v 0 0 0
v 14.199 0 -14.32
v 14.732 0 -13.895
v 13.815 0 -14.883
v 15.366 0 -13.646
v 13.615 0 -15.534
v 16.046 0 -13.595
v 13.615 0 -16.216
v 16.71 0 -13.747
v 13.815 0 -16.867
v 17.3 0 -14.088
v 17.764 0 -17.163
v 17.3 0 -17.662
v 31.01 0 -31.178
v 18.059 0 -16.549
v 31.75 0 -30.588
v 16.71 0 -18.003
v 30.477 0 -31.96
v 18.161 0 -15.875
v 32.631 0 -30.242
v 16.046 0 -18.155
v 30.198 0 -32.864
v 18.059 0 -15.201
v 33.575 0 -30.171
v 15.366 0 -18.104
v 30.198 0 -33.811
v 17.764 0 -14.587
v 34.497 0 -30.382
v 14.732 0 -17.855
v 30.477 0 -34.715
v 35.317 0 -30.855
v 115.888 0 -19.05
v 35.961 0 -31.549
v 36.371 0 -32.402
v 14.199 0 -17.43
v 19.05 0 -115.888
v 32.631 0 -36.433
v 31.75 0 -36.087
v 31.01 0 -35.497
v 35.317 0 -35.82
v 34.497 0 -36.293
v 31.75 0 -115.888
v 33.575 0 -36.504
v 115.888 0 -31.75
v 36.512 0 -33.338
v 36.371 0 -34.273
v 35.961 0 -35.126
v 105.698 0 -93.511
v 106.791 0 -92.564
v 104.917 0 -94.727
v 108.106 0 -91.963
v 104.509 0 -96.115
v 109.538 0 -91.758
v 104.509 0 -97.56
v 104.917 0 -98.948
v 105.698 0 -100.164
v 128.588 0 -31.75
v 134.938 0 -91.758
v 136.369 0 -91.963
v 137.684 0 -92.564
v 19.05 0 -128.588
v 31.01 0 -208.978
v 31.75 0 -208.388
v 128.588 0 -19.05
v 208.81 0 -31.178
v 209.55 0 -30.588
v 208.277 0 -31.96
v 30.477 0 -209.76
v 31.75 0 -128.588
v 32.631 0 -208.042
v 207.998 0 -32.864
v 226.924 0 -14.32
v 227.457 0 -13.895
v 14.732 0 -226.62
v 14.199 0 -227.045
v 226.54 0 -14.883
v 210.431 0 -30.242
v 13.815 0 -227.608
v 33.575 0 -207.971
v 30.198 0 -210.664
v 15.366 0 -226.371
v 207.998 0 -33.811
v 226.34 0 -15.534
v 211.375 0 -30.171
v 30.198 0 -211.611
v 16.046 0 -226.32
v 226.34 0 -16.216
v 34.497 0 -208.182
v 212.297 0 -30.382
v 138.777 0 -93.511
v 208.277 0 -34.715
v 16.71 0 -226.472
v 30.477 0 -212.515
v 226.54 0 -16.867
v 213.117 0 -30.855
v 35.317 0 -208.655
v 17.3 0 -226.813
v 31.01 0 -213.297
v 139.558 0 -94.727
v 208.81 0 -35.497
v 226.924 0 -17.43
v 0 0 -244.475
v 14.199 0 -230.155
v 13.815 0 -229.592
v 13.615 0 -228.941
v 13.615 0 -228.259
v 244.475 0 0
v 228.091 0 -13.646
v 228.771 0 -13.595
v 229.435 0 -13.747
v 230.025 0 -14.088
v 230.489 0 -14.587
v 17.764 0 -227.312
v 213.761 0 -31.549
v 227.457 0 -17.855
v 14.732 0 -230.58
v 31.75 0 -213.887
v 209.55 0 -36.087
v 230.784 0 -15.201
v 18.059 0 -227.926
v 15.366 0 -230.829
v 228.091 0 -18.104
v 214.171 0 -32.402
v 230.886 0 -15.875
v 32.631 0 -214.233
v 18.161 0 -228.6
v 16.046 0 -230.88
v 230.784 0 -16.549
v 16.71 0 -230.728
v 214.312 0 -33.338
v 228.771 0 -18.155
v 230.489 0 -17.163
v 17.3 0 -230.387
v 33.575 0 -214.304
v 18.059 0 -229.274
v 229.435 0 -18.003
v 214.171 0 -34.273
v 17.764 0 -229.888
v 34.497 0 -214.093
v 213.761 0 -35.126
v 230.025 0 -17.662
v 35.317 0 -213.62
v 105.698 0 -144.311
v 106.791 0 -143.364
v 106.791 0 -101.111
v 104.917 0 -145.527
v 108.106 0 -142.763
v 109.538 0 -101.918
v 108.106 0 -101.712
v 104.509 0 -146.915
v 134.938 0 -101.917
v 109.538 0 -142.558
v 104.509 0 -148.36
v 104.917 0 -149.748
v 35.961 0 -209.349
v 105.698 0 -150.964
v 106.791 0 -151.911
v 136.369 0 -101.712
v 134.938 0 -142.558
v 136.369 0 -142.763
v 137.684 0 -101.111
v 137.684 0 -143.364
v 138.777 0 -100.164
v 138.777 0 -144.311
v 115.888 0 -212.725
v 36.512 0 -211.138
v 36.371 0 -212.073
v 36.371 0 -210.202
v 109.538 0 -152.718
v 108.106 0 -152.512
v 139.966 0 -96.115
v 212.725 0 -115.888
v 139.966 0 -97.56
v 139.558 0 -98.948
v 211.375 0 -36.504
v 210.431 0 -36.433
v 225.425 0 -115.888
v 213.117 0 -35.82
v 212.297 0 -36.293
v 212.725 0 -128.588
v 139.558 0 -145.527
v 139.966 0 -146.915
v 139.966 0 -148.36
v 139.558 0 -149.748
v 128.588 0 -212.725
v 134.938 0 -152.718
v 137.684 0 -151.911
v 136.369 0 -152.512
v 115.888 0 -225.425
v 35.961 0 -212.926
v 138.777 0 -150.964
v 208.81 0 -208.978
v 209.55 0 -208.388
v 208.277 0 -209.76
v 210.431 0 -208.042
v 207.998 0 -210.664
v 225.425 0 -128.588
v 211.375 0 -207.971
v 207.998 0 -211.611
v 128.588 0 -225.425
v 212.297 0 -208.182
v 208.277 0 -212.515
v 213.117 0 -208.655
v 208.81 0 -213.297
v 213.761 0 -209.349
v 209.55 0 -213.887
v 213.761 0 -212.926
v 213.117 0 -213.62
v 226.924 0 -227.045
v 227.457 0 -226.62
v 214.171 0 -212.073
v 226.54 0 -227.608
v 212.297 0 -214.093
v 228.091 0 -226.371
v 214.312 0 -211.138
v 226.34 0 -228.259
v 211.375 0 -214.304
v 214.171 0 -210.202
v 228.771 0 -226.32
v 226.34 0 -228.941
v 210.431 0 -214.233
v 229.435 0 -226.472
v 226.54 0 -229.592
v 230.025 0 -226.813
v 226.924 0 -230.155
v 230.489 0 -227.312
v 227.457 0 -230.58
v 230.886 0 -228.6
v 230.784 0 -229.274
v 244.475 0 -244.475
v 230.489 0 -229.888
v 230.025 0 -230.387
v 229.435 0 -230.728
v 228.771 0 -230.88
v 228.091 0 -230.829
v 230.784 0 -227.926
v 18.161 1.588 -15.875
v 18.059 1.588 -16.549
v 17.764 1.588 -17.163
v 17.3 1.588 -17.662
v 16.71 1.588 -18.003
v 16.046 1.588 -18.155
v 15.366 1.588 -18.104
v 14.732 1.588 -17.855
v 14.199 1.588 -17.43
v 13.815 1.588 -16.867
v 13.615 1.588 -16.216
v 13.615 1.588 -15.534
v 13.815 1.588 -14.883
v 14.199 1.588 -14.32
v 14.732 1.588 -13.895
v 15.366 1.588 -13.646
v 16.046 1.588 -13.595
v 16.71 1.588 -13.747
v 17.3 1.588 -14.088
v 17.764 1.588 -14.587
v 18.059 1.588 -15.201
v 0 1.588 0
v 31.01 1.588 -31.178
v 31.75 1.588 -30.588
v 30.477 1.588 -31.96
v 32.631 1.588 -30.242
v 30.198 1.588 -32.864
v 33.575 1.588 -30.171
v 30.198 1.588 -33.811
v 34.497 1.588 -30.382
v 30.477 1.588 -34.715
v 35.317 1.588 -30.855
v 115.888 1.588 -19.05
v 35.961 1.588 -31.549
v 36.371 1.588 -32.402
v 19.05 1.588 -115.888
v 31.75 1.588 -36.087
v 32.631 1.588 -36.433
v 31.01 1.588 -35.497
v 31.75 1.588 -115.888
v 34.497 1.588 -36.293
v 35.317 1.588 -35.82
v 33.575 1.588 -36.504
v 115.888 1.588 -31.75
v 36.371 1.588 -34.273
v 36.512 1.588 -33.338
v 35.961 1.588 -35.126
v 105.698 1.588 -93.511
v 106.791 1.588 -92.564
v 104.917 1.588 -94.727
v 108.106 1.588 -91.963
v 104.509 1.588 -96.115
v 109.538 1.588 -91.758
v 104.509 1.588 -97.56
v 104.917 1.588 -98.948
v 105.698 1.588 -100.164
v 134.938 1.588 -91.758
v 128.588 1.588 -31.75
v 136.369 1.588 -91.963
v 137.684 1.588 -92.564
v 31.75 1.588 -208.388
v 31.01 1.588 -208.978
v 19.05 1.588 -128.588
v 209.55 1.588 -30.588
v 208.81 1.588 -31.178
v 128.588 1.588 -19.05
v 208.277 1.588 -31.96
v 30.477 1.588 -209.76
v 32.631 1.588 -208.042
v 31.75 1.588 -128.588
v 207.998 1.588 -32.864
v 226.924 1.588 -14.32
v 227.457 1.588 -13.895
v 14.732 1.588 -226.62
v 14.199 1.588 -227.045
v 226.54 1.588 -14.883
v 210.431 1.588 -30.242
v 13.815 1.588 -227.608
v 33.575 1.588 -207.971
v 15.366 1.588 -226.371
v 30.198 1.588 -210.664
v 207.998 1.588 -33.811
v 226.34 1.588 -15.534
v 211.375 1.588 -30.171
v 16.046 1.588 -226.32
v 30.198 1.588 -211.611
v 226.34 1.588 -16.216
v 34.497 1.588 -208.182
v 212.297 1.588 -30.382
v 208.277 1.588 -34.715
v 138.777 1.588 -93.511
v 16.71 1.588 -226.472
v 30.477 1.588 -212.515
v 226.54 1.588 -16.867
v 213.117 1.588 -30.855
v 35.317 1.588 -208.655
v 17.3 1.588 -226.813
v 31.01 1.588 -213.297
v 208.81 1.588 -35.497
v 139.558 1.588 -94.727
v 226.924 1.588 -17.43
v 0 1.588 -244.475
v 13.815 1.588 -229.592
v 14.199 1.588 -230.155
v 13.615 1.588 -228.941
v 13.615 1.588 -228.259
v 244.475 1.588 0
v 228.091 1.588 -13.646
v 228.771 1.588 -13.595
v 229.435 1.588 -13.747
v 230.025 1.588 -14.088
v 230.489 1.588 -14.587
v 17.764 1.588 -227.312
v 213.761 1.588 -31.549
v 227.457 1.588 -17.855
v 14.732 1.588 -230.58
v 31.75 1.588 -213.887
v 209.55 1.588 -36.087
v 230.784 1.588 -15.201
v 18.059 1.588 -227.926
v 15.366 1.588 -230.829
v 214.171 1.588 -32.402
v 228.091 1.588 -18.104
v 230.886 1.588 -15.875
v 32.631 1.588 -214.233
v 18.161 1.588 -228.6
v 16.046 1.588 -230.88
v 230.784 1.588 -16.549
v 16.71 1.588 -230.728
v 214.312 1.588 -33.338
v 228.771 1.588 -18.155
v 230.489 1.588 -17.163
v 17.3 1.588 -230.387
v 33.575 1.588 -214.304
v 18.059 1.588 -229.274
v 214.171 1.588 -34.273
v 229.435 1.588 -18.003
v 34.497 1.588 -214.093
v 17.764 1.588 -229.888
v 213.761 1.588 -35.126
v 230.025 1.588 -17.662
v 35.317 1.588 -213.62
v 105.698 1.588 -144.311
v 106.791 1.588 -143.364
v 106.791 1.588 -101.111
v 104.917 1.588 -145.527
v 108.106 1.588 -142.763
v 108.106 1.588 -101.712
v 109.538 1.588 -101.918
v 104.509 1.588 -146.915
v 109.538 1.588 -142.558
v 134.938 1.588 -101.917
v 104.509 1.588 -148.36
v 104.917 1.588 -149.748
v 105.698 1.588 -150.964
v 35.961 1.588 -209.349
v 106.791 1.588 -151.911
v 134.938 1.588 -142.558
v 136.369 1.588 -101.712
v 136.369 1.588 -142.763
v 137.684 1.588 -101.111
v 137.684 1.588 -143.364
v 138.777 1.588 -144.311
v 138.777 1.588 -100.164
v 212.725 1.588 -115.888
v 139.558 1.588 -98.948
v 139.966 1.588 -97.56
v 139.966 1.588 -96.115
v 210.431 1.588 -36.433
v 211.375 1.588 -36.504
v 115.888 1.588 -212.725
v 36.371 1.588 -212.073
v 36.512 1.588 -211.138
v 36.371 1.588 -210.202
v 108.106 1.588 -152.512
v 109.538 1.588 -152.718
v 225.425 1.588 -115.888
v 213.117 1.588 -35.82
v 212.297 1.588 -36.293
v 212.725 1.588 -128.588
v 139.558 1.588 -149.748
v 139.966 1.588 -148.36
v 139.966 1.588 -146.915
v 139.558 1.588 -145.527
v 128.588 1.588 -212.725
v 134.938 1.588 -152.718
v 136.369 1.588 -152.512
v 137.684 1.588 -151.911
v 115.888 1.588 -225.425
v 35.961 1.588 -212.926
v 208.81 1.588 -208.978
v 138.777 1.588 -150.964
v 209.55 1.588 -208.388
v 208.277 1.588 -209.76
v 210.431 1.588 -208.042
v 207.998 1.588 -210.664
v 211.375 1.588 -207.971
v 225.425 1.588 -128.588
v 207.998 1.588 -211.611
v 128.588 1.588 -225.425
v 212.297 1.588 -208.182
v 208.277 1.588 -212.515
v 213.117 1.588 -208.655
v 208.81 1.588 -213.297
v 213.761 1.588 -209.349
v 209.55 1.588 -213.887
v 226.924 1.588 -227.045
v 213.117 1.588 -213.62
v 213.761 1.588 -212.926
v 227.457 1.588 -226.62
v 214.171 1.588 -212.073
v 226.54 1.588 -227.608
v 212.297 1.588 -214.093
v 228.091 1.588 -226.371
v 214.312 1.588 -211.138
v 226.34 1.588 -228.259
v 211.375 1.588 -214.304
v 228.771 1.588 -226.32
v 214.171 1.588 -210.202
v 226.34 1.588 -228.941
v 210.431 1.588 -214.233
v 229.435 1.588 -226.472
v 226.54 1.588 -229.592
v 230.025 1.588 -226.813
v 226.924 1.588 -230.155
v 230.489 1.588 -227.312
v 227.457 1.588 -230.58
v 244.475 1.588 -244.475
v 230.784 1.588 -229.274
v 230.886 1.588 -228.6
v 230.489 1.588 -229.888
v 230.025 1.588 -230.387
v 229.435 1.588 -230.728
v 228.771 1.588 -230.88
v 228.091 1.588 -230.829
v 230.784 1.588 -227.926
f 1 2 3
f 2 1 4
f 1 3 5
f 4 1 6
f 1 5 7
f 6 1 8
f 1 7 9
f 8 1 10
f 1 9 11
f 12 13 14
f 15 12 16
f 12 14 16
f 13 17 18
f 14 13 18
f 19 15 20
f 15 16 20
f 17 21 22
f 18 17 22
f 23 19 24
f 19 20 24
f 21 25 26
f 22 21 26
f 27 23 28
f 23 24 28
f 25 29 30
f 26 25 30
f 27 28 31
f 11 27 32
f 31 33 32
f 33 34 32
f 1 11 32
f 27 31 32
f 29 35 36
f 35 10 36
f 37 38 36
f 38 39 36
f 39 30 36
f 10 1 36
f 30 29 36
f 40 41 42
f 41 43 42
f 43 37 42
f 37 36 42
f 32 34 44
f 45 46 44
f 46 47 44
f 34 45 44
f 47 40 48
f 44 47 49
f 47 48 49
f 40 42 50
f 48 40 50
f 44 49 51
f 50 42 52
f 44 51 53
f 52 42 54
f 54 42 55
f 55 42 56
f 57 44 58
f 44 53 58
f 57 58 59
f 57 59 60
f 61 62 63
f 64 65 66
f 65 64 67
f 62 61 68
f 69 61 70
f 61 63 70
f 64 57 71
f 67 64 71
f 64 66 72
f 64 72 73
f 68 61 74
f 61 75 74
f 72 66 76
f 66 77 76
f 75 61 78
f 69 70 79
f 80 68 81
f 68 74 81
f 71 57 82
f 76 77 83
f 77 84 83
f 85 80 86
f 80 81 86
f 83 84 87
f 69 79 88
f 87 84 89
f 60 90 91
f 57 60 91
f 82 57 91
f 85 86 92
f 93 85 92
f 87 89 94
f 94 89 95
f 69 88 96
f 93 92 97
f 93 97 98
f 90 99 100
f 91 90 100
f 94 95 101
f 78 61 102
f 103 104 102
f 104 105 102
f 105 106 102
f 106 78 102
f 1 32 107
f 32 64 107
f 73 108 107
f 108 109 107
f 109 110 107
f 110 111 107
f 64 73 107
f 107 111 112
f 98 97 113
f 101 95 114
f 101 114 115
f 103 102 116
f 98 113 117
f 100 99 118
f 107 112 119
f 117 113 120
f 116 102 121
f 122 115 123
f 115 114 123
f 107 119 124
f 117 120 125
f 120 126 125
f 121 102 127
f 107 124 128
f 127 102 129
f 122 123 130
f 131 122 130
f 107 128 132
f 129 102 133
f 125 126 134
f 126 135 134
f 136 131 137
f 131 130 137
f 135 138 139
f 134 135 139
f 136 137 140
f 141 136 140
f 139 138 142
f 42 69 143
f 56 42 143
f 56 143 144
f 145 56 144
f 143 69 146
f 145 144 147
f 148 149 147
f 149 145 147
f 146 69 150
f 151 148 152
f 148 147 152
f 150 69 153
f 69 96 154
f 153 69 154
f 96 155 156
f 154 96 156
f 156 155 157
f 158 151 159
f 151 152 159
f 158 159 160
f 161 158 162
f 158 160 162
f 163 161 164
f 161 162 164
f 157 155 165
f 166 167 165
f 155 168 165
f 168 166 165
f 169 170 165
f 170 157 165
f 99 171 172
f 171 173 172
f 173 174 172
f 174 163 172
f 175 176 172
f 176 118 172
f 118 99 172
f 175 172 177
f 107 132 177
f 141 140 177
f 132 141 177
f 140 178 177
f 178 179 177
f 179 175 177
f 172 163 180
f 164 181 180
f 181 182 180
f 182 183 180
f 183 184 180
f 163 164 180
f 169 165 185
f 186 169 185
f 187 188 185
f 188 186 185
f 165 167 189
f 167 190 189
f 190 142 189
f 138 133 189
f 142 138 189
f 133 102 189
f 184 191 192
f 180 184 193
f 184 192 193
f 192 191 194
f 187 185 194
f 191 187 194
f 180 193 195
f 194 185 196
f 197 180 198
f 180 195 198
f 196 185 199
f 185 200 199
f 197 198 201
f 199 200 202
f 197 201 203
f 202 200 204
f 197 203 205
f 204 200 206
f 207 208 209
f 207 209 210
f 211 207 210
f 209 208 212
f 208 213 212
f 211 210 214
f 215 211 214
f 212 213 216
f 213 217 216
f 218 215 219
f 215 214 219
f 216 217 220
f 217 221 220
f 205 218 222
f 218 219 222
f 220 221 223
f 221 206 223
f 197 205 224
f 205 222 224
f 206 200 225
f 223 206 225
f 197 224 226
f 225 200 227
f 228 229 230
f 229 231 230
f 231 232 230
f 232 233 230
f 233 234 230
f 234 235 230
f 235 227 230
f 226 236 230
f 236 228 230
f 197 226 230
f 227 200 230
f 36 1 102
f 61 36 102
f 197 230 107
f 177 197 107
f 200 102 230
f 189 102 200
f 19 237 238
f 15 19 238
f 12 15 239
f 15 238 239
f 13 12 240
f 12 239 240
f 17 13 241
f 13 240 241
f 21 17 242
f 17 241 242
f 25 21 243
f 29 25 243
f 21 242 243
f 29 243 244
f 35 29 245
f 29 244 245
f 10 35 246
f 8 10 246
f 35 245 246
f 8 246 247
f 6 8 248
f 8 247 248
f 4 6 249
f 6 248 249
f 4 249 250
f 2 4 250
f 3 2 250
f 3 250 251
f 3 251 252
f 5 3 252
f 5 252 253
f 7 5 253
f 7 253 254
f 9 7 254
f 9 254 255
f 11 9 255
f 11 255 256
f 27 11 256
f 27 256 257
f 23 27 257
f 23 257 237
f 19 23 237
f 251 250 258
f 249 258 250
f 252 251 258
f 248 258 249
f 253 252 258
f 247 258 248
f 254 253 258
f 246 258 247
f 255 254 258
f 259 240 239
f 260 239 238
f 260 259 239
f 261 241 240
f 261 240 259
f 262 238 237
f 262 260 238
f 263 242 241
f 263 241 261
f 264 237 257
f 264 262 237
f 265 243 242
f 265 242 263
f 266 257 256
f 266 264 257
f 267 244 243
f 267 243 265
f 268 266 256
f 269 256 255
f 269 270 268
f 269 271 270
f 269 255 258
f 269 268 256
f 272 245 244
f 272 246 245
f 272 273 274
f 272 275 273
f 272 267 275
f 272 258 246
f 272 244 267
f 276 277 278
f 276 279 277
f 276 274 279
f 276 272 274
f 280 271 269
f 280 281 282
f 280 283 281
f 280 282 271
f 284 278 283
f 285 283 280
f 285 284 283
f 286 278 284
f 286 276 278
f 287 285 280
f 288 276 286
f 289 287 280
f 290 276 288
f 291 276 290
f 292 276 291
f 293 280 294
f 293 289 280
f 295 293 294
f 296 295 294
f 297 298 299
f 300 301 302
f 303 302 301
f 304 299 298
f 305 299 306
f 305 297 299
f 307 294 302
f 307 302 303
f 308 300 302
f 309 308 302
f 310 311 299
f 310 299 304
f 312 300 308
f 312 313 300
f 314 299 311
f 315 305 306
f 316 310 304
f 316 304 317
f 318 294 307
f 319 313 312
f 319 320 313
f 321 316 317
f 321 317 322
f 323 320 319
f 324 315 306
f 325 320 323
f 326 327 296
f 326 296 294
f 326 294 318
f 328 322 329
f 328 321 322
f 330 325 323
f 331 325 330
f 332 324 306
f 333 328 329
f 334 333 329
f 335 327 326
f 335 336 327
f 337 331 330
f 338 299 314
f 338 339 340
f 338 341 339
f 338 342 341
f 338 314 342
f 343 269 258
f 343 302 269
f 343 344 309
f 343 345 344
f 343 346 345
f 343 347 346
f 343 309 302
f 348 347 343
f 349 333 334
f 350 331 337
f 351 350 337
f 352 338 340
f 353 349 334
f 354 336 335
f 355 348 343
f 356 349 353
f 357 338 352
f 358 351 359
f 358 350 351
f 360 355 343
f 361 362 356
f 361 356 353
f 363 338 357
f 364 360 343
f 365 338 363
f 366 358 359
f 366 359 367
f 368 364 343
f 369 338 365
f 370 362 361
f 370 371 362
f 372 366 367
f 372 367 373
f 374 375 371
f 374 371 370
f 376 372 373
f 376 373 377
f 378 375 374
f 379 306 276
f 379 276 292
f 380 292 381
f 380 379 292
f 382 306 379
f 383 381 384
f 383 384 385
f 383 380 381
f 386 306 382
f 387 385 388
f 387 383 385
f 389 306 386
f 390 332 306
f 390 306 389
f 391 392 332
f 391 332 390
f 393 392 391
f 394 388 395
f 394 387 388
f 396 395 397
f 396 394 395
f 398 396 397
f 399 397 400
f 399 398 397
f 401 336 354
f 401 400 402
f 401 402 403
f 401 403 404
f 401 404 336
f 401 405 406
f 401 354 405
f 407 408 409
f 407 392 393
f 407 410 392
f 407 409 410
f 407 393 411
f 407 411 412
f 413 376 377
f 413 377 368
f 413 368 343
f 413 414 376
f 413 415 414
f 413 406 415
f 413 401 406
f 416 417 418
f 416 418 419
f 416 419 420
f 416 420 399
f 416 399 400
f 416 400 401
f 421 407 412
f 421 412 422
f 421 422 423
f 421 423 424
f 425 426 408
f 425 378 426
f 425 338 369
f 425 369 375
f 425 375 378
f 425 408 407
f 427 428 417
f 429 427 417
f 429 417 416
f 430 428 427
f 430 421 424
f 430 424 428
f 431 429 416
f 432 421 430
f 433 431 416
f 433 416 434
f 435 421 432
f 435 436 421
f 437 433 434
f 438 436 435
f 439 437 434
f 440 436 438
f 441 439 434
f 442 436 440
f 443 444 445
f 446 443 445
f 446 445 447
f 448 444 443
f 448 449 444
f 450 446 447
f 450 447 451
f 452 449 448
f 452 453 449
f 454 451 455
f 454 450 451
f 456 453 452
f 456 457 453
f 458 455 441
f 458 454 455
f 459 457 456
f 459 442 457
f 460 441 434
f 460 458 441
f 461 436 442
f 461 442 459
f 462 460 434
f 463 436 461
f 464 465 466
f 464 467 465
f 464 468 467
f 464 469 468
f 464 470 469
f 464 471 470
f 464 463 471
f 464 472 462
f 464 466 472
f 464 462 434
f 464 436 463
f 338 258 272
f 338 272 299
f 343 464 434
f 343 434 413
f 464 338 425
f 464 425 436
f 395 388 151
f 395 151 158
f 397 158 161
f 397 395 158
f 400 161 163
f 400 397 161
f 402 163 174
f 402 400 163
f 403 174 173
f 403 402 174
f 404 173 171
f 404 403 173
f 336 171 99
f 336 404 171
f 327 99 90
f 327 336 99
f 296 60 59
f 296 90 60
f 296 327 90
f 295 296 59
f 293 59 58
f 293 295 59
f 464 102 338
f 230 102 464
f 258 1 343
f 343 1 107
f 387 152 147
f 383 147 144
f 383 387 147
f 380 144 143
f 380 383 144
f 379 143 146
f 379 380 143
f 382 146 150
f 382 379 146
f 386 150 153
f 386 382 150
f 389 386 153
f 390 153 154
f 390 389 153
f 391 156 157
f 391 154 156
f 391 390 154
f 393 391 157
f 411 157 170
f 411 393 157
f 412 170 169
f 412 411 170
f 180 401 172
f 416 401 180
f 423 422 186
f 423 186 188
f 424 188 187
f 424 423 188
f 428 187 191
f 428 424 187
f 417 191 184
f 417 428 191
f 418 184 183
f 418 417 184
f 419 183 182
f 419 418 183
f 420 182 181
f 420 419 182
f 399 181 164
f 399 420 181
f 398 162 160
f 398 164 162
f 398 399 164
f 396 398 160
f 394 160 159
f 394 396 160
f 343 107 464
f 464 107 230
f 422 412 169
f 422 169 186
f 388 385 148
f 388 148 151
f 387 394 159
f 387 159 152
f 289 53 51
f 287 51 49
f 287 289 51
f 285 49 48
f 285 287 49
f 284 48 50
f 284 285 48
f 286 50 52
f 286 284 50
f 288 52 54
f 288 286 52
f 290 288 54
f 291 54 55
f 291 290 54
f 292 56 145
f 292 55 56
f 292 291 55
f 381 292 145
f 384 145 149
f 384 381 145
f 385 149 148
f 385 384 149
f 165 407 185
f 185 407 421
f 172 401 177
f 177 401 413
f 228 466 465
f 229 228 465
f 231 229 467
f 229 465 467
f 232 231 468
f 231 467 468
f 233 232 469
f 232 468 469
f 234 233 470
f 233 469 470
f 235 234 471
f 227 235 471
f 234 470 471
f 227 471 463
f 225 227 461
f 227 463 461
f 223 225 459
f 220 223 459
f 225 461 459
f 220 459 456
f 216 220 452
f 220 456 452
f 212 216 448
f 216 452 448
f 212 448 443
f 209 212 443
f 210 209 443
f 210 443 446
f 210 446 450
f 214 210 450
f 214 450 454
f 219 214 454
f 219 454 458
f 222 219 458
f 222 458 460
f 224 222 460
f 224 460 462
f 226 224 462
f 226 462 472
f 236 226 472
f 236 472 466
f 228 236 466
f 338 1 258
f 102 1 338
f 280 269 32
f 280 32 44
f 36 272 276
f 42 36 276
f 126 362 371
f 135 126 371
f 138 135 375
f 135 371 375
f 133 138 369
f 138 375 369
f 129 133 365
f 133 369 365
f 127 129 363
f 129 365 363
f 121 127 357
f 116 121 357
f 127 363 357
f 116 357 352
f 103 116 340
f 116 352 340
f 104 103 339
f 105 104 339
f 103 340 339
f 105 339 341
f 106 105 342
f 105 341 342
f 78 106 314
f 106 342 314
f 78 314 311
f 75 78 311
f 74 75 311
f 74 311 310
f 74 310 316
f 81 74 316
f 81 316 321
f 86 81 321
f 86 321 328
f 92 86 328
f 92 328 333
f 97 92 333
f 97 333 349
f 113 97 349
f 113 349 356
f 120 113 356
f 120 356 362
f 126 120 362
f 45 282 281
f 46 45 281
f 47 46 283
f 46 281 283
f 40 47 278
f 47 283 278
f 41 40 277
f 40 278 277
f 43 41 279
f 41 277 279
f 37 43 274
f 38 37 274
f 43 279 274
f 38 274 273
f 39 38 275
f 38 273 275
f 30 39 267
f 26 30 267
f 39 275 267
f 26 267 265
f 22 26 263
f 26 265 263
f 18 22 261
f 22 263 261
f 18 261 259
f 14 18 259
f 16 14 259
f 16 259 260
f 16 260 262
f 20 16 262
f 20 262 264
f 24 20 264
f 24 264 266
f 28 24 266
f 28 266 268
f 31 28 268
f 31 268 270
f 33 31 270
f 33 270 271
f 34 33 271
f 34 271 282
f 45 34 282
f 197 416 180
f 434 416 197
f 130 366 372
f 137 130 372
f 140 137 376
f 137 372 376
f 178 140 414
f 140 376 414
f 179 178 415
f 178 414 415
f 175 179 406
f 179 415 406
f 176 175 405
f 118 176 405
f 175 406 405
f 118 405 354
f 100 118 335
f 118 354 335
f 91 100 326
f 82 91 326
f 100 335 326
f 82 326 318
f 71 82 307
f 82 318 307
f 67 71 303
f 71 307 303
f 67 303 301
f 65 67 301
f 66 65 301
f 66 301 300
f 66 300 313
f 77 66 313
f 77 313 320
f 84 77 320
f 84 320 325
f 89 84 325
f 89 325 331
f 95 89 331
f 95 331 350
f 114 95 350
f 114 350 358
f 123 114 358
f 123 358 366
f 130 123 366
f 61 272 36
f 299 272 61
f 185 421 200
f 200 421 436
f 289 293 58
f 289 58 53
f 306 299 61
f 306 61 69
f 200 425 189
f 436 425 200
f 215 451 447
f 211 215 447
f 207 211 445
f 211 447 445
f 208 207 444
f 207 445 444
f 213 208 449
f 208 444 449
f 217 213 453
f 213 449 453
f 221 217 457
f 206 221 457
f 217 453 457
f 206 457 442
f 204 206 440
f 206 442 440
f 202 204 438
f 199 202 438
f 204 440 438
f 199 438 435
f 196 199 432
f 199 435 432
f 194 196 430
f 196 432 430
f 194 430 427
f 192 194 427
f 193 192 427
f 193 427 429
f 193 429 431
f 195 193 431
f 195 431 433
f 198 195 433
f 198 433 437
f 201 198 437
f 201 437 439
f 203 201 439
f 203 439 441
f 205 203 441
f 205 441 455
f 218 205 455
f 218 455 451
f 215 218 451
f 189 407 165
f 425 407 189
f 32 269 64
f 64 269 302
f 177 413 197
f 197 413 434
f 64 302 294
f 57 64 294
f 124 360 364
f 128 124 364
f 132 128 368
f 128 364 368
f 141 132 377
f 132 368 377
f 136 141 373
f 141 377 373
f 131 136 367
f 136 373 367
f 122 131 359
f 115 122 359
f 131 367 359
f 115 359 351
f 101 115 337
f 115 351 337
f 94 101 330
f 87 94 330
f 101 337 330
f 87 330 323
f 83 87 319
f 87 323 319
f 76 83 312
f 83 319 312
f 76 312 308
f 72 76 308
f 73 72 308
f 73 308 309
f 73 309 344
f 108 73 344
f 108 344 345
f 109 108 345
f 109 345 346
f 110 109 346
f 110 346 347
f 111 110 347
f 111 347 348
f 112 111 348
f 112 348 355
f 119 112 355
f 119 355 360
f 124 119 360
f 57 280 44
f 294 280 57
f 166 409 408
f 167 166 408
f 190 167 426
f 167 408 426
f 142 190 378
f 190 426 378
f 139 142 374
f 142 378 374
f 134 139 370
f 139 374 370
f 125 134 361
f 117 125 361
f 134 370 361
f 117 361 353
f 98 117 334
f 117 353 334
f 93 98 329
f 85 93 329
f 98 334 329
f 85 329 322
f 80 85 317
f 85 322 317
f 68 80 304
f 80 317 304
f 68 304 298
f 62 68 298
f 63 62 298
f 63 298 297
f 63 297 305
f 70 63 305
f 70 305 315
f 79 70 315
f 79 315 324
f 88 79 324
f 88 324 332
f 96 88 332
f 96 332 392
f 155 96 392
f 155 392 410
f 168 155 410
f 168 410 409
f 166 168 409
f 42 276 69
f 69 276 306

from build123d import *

# Parameters (mm, degrees)
SKETCH1_W                    = 244.475
SKETCH1_H                    = 244.475
MAIN_BODY_DEPTH              = 1.5875
SKETCH2_R                    = 3.175
SKETCH2_R_2                  = 2.286
SCREW_AND_STRING_HOLES_DEPTH = 2.5875
SKETCH4_W                    = 12.7
SKETCH4_H                    = 12.7
LED_HOLES_DEPTH              = 2.5875
EXTERNAL_CABLE_SLOTS_DEPTH   = 2.5875


with BuildPart() as part:
    # Sketch1 → Main Body (new body)
    with BuildSketch(Plane(origin=(0, 0, 0), x_dir=(1, 0, 0), z_dir=(0, 1, 0))):
        with Locations((122.2375, 122.2375)):
            Rectangle(SKETCH1_W, SKETCH1_H)
    extrude(amount=MAIN_BODY_DEPTH)

    # Sketch2 → Screw and String Holes (cut, through all)
    with BuildSketch(Plane(origin=(0, 1.5875, 0), x_dir=(1, 0, 0), z_dir=(0, 1, 0))):
        with Locations((211.1375, 33.3375)):
            Circle(SKETCH2_R)
        with Locations((33.3375, 33.3375)):
            Circle(SKETCH2_R)
        with Locations((33.3375, 211.1375)):
            Circle(SKETCH2_R)
        with Locations((211.1375, 211.1375)):
            Circle(SKETCH2_R)
        with Locations((228.6, 15.875)):
            Circle(SKETCH2_R_2)
        with Locations((15.875, 15.875)):
            Circle(SKETCH2_R_2)
        with Locations((15.875000001, 228.6)):
            Circle(SKETCH2_R_2)
        with Locations((228.6, 228.6)):
            Circle(SKETCH2_R_2)
    extrude(amount=-SCREW_AND_STRING_HOLES_DEPTH, mode=Mode.SUBTRACT)

    # Sketch4 → LED Holes (cut, through all)
    with BuildSketch(Plane(origin=(0, 1.5875, 0), x_dir=(1, 0, 0), z_dir=(0, 1, 0))):
        with Locations((122.2375, 25.4)):
            Rectangle(SKETCH4_W, SKETCH4_H)
        with Locations((25.4, 122.2375)):
            Rectangle(SKETCH4_W, SKETCH4_H)
        with Locations((122.2375, 219.075)):
            Rectangle(SKETCH4_W, SKETCH4_H)
        with Locations((219.075, 122.2375)):
            Rectangle(SKETCH4_W, SKETCH4_H)
    extrude(amount=-LED_HOLES_DEPTH, mode=Mode.SUBTRACT)

    # Sketch5 → External Cable Slots (cut, through all)
    with BuildSketch(Plane(origin=(0, 1.5875, 0), x_dir=(1, 0, 0), z_dir=(0, 1, 0))):
        with BuildLine():
            Line((109.5375, 101.9175), (134.9375, 101.9175))
            ThreePointArc((134.9375, 101.9175), (140.0175, 96.8375), (134.9375, 91.7575))
            Line((134.9375, 91.7575), (109.5375, 91.7575))
            ThreePointArc((109.5375, 91.7575), (104.4575, 96.8375), (109.5375, 101.9175))
        make_face()
        with BuildLine():
            Line((109.5375, 152.7175), (134.9375, 152.7175))
            ThreePointArc((134.9375, 152.7175), (140.0175, 147.6375), (134.9375, 142.5575))
            Line((134.9375, 142.5575), (109.5375, 142.5575))
            ThreePointArc((109.5375, 142.5575), (104.4575, 147.6375), (109.5375, 152.7175))
        make_face()
    extrude(amount=-EXTERNAL_CABLE_SLOTS_DEPTH, mode=Mode.SUBTRACT)


solid = part.part
